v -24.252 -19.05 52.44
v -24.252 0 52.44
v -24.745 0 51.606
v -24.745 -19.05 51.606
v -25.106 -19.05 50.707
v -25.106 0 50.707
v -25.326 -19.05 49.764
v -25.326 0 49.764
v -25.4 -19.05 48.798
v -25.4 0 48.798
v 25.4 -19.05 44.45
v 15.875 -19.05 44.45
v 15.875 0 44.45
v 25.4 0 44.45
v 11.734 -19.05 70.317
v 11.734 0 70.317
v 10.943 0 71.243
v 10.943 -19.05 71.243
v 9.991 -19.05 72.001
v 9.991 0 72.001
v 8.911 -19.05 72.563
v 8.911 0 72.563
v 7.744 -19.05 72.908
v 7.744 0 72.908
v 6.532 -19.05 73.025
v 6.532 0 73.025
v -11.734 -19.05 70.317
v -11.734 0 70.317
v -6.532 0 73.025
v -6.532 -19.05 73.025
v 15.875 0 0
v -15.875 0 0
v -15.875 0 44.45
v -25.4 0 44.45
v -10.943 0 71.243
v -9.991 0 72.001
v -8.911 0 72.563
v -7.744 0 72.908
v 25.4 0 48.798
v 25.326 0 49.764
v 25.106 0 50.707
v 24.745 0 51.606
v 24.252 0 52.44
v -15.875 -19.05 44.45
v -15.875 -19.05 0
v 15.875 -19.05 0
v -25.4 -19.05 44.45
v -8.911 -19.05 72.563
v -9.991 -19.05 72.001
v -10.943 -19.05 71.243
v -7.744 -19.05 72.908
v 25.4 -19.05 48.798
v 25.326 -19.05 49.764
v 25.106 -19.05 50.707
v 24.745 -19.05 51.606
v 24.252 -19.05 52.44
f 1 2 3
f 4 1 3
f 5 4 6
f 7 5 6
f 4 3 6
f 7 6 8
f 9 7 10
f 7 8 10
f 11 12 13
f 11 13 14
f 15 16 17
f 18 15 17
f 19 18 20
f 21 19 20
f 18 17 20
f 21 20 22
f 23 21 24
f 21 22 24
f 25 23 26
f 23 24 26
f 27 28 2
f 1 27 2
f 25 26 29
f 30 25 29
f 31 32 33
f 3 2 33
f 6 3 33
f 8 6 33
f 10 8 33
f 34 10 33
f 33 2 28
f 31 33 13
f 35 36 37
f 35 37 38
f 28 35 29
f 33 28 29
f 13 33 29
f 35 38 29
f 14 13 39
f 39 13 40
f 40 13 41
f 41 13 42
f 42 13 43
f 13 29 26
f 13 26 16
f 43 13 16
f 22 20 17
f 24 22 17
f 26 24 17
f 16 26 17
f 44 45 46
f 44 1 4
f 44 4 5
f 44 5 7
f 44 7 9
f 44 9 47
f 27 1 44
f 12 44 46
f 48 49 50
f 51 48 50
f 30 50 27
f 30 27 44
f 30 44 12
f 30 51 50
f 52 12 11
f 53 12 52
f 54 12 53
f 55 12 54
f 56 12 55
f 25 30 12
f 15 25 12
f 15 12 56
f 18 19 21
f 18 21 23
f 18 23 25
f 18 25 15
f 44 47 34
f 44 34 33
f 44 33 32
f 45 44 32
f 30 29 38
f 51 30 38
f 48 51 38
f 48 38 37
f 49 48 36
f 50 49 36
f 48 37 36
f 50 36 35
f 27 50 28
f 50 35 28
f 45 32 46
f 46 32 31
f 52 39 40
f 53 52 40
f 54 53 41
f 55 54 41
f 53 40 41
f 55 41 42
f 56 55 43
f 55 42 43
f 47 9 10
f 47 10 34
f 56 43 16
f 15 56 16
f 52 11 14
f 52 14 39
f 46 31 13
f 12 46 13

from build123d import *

# Parameters (mm, degrees)
F1_DEPTH = 19.05


with BuildPart() as f1:
    # F0 (on Front) → F1 (new body)
    with BuildSketch(Plane.XZ):
        with BuildLine():
            Line((-15.875, 0), (0, 0))
            Line((0, 0), (15.875, 0))
            Line((15.875, 0), (15.875, 44.45))
            Line((15.875, 44.45), (25.4, 44.45))
            Line((25.4, 44.45), (25.4, 48.797853))
            ThreePointArc((25.4, 48.797853), (25.106103, 50.707335), (24.251615, 52.440063))
            Line((24.251615, 52.440063), (11.733902, 70.31721))
            ThreePointArc((11.733902, 70.31721), (9.46439, 72.307519), (6.532287, 73.025))
            Line((6.532287, 73.025), (0, 73.025))
            Line((0, 73.025), (-6.532287, 73.025))
            ThreePointArc((-6.532287, 73.025), (-9.46439, 72.307519), (-11.733902, 70.31721))
            Line((-11.733902, 70.31721), (-24.251615, 52.440063))
            ThreePointArc((-24.251615, 52.440063), (-25.106103, 50.707335), (-25.4, 48.797853))
            Line((-25.4, 48.797853), (-25.4, 44.45))
            Line((-25.4, 44.45), (-15.875, 44.45))
            Line((-15.875, 44.45), (-15.875, 0))
        make_face()
    extrude(amount=F1_DEPTH)


solid = f1.part
